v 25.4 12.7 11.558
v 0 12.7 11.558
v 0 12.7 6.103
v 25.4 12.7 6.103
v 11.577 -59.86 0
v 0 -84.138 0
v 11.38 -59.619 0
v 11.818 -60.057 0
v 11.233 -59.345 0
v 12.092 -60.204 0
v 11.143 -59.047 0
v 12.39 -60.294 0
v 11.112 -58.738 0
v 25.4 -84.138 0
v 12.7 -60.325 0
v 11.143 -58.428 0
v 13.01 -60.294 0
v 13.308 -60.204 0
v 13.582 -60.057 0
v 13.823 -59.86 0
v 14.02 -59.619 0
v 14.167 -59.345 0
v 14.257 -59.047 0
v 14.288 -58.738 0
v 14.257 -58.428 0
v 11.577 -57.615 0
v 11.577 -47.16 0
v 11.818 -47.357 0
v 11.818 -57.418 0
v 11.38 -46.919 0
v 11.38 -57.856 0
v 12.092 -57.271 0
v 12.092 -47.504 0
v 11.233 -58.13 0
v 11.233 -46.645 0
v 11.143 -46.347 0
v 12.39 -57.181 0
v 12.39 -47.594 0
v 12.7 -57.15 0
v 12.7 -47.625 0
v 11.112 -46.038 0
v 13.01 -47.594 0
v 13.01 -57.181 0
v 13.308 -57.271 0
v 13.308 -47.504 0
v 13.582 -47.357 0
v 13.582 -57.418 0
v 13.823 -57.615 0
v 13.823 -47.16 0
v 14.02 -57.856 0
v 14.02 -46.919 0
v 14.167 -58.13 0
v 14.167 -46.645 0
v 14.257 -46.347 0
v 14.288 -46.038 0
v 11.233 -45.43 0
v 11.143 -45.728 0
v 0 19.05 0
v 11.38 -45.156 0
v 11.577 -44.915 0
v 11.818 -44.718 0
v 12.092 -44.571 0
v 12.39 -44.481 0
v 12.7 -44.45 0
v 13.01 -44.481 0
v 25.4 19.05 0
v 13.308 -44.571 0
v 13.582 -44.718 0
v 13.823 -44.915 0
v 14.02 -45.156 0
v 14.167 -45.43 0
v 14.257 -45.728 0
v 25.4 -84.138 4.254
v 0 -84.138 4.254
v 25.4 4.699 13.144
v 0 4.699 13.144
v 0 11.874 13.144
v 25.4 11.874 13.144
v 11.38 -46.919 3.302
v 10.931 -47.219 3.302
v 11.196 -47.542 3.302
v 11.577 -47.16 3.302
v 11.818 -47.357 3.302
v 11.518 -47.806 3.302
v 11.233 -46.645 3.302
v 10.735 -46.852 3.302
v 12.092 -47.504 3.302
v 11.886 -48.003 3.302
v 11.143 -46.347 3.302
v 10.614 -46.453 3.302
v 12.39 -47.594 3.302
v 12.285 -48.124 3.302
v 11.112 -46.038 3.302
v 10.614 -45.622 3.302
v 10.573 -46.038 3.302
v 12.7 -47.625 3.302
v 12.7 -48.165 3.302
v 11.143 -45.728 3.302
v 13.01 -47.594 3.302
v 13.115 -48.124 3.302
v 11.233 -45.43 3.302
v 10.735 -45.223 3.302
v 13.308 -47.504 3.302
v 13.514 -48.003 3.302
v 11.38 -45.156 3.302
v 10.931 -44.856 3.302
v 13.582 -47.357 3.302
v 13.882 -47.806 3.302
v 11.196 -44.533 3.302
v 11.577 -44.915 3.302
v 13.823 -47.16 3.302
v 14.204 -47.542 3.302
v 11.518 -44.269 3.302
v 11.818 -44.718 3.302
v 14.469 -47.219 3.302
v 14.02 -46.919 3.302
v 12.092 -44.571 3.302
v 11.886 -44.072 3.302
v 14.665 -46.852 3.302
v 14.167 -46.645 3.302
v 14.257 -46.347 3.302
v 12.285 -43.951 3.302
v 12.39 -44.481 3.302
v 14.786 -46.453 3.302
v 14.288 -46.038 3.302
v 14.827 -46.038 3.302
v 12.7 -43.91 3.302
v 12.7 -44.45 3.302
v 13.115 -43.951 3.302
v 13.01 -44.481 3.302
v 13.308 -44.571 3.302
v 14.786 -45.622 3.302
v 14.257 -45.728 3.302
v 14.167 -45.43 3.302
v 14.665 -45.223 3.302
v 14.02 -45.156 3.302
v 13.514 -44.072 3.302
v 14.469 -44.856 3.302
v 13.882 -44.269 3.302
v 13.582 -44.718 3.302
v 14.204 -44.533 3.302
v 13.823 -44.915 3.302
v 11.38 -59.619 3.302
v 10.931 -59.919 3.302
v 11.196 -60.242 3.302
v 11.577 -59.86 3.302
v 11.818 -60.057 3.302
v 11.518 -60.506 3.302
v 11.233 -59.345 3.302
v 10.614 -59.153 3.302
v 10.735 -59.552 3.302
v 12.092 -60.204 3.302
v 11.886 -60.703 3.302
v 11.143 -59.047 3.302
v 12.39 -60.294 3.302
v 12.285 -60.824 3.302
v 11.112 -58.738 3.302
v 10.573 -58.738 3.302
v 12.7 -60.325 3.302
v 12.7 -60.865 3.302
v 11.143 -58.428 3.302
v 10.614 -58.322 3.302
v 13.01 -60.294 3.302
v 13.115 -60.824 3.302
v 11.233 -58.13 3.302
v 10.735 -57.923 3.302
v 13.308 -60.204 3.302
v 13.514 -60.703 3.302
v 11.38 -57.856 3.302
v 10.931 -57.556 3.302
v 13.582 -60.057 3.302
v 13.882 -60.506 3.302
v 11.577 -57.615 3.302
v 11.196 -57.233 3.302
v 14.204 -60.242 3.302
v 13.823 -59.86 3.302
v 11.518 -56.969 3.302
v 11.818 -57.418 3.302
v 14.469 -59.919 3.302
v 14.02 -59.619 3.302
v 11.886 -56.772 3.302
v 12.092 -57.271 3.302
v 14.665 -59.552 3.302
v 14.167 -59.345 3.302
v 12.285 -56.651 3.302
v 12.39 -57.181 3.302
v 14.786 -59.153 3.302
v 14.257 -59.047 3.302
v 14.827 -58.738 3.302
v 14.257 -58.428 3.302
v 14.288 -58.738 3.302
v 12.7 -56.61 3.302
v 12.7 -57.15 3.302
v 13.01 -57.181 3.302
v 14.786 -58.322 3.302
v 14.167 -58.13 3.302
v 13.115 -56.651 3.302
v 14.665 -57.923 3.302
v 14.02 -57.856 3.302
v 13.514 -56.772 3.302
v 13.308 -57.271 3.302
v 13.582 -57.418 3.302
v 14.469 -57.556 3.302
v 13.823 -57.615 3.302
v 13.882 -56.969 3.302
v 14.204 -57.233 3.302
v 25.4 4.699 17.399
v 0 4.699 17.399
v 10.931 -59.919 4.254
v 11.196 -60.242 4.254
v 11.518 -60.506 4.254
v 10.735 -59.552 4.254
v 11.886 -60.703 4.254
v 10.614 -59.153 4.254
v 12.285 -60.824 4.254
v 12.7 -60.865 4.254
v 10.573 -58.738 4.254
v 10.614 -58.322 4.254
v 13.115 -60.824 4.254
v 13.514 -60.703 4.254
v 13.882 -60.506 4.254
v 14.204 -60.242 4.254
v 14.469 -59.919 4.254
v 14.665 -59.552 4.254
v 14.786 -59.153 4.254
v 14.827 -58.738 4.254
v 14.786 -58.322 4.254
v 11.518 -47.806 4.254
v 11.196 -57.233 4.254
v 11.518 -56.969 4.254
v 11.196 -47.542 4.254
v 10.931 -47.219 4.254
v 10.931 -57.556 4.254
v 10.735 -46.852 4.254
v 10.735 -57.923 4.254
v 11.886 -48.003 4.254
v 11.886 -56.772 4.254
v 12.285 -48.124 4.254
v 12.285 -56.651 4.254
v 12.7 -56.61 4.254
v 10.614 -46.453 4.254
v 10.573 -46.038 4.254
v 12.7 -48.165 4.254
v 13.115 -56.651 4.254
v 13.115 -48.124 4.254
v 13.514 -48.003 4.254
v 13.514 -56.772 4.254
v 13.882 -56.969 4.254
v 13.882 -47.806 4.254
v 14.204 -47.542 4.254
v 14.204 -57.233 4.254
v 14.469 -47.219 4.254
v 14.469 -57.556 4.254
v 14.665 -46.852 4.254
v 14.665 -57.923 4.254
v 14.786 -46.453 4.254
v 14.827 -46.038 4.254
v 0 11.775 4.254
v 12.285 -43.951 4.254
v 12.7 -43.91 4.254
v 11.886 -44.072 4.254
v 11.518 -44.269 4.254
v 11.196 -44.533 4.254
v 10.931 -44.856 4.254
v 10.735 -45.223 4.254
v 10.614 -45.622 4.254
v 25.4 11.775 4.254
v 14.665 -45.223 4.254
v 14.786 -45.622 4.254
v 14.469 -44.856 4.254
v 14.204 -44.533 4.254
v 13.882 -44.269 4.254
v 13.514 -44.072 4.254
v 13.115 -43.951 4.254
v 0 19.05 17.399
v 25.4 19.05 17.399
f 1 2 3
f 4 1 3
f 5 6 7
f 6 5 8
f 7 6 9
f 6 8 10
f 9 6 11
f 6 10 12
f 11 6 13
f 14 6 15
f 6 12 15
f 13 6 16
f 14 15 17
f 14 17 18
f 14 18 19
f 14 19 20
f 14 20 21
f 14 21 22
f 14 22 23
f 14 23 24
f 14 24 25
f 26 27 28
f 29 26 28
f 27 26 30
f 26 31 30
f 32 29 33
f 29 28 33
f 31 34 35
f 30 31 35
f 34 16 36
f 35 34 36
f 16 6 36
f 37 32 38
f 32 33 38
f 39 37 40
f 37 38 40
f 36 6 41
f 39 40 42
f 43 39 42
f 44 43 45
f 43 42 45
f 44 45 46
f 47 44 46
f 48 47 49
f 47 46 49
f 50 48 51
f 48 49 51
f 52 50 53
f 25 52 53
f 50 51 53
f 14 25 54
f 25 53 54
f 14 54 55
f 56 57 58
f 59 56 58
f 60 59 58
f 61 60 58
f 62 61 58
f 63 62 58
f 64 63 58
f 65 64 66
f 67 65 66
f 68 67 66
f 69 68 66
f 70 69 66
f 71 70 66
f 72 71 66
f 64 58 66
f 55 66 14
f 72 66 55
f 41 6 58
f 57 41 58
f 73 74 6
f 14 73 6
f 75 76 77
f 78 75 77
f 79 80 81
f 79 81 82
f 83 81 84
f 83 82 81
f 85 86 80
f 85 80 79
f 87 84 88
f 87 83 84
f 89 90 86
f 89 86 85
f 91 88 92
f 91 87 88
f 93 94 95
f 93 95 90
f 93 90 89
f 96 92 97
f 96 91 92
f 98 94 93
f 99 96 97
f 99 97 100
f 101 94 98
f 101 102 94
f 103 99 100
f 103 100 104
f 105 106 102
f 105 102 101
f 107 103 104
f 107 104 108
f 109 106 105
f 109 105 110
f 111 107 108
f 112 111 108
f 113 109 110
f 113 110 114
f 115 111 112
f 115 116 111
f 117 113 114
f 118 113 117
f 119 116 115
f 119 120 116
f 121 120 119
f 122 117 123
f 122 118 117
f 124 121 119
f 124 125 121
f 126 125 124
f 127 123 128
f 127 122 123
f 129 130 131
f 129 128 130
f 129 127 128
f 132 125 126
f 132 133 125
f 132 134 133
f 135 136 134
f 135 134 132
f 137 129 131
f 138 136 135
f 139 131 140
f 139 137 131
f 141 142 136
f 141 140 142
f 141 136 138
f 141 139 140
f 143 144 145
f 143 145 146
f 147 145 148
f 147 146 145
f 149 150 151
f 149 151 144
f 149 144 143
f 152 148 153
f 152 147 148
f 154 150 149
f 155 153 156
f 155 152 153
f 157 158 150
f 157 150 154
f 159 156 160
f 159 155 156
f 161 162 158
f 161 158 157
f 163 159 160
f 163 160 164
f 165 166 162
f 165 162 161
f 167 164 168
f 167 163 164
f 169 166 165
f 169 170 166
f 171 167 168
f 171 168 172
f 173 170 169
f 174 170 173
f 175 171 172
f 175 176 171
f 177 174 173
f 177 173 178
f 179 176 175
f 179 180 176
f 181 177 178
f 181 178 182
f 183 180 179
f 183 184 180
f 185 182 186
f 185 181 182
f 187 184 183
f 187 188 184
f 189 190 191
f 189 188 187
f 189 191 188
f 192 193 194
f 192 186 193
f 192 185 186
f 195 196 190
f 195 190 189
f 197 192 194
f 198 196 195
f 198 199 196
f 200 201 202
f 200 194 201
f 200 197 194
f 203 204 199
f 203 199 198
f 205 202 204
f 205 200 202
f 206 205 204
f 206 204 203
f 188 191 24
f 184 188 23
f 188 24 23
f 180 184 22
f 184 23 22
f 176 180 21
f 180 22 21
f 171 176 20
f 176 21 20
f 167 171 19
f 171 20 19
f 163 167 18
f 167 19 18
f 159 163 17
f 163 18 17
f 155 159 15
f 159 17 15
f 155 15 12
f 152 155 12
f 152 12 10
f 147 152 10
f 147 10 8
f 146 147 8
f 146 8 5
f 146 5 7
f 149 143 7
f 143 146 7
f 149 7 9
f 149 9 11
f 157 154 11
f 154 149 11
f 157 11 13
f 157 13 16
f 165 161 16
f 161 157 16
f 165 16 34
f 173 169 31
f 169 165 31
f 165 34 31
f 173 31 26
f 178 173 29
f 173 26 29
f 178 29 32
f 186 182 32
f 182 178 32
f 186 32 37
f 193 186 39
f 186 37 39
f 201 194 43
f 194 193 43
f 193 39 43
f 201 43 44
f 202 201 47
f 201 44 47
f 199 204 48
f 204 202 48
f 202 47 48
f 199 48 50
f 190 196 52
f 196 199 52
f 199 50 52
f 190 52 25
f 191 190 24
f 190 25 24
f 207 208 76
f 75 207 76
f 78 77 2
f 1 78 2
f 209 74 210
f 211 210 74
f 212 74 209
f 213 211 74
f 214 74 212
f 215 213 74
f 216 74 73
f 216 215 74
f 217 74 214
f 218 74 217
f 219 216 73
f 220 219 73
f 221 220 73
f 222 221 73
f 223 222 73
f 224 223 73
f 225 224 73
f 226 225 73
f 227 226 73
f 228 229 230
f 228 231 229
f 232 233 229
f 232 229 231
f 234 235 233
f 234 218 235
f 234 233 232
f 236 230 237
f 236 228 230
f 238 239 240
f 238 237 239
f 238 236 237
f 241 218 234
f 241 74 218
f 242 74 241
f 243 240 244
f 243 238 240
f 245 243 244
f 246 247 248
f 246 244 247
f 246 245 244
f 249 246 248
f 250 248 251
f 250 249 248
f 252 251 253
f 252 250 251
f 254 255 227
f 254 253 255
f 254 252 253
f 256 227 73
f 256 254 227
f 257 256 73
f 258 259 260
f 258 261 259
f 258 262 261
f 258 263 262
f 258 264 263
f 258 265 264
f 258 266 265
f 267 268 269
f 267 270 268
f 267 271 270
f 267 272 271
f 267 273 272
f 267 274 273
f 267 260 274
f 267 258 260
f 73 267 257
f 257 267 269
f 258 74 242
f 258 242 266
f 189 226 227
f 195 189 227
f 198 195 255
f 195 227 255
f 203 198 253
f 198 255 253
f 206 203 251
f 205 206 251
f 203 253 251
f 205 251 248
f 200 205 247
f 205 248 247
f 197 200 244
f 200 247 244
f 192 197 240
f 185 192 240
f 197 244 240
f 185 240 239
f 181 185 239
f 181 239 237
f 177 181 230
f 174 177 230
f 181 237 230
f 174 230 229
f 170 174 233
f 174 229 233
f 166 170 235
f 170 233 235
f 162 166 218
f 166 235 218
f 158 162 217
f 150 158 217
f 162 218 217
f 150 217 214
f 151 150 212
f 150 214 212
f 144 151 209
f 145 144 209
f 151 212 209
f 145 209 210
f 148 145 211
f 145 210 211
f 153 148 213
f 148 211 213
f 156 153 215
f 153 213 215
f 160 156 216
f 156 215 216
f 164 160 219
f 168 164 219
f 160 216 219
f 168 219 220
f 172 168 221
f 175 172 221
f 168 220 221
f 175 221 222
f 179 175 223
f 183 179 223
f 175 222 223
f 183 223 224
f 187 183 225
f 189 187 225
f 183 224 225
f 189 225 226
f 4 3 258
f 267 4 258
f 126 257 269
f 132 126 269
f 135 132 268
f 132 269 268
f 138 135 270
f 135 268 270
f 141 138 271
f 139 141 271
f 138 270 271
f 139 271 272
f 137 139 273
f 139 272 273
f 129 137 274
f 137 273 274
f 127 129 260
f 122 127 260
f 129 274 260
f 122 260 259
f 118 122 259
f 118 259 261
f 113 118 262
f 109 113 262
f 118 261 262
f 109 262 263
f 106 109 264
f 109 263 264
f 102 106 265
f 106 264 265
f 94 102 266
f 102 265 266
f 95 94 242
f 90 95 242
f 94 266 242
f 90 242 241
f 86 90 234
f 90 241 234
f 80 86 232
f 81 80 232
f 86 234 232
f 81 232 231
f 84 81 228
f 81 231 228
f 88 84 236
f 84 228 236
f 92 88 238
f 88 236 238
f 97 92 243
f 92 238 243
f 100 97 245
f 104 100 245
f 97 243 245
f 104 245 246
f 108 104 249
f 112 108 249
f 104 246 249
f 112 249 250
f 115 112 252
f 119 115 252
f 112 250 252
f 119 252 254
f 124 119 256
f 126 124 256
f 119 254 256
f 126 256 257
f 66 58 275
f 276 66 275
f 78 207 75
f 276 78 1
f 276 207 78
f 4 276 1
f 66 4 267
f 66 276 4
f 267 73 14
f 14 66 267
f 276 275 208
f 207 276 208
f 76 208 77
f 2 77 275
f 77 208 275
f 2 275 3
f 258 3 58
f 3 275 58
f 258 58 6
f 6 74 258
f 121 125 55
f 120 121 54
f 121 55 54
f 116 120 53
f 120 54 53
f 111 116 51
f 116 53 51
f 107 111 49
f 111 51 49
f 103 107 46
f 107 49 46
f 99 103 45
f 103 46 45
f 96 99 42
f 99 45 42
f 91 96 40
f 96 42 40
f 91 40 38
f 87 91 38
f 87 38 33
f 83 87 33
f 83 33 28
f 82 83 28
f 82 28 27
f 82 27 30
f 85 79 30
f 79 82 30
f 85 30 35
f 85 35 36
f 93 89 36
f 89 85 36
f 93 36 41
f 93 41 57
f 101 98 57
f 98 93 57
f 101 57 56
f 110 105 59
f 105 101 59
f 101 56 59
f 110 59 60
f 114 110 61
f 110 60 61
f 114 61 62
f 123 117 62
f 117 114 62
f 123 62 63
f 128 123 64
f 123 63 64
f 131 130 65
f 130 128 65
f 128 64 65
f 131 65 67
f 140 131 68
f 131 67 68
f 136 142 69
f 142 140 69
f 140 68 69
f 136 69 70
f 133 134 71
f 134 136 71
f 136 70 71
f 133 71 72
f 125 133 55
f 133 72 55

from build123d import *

# Parameters (mm, degrees)
F1_DEPTH = 25.4
F2_DEPTH = 84.1375
F3_R     = 1.5875
F4_DEPTH = 25.4
F5_R     = 2.12725
F5_R_2   = 1.5875
F6_DEPTH = 0.9525


with BuildPart() as f1:
    # F0 (on Right) → F1 (new body)
    with BuildSketch(Plane.YZ):
        Polygon((0, 4.2545), (0, 0), (19.05, 0), (19.05, 4.2545), (19.05, 17.0903187245), (19.05, 17.399), (4.699, 17.399), (4.699, 13.1445), (11.8745, 13.1445), (12.7, 11.5581387654), (12.7, 6.1031985097), (11.7745716125, 4.2545), align=None)
    extrude(amount=F1_DEPTH)

    # F2 (add): a face of the model
    f2_faces = [f1.faces().sort_by_distance(p)[0] for p in [
        (12.7, 0, 2.12725),
    ]]
    extrude(f2_faces, amount=F2_DEPTH)

    # F3 (on face) → F4 (cut)
    with BuildSketch(Plane(origin=(0, 0, 0), x_dir=(1, 0, 0), z_dir=(0, 0, -1))):
        with Locations((12.7, 58.7375)):
            Circle(F3_R)
        with Locations((12.7, 46.0375)):
            Circle(F3_R)
    extrude(amount=-F4_DEPTH, mode=Mode.SUBTRACT)

    # F5 (on face) → F6 (cut)
    with BuildSketch(Plane.XY.offset(4.2545)):
        with Locations((12.7, -46.0375)):
            Circle(F5_R)
        with Locations((12.7, -46.0375)):
            Circle(F5_R_2, mode=Mode.SUBTRACT)
        with Locations((12.7, -58.7375)):
            Circle(F5_R)
        with Locations((12.7, -58.7375)):
            Circle(F5_R_2, mode=Mode.SUBTRACT)
    extrude(amount=-F6_DEPTH, mode=Mode.SUBTRACT)


solid = f1.part
